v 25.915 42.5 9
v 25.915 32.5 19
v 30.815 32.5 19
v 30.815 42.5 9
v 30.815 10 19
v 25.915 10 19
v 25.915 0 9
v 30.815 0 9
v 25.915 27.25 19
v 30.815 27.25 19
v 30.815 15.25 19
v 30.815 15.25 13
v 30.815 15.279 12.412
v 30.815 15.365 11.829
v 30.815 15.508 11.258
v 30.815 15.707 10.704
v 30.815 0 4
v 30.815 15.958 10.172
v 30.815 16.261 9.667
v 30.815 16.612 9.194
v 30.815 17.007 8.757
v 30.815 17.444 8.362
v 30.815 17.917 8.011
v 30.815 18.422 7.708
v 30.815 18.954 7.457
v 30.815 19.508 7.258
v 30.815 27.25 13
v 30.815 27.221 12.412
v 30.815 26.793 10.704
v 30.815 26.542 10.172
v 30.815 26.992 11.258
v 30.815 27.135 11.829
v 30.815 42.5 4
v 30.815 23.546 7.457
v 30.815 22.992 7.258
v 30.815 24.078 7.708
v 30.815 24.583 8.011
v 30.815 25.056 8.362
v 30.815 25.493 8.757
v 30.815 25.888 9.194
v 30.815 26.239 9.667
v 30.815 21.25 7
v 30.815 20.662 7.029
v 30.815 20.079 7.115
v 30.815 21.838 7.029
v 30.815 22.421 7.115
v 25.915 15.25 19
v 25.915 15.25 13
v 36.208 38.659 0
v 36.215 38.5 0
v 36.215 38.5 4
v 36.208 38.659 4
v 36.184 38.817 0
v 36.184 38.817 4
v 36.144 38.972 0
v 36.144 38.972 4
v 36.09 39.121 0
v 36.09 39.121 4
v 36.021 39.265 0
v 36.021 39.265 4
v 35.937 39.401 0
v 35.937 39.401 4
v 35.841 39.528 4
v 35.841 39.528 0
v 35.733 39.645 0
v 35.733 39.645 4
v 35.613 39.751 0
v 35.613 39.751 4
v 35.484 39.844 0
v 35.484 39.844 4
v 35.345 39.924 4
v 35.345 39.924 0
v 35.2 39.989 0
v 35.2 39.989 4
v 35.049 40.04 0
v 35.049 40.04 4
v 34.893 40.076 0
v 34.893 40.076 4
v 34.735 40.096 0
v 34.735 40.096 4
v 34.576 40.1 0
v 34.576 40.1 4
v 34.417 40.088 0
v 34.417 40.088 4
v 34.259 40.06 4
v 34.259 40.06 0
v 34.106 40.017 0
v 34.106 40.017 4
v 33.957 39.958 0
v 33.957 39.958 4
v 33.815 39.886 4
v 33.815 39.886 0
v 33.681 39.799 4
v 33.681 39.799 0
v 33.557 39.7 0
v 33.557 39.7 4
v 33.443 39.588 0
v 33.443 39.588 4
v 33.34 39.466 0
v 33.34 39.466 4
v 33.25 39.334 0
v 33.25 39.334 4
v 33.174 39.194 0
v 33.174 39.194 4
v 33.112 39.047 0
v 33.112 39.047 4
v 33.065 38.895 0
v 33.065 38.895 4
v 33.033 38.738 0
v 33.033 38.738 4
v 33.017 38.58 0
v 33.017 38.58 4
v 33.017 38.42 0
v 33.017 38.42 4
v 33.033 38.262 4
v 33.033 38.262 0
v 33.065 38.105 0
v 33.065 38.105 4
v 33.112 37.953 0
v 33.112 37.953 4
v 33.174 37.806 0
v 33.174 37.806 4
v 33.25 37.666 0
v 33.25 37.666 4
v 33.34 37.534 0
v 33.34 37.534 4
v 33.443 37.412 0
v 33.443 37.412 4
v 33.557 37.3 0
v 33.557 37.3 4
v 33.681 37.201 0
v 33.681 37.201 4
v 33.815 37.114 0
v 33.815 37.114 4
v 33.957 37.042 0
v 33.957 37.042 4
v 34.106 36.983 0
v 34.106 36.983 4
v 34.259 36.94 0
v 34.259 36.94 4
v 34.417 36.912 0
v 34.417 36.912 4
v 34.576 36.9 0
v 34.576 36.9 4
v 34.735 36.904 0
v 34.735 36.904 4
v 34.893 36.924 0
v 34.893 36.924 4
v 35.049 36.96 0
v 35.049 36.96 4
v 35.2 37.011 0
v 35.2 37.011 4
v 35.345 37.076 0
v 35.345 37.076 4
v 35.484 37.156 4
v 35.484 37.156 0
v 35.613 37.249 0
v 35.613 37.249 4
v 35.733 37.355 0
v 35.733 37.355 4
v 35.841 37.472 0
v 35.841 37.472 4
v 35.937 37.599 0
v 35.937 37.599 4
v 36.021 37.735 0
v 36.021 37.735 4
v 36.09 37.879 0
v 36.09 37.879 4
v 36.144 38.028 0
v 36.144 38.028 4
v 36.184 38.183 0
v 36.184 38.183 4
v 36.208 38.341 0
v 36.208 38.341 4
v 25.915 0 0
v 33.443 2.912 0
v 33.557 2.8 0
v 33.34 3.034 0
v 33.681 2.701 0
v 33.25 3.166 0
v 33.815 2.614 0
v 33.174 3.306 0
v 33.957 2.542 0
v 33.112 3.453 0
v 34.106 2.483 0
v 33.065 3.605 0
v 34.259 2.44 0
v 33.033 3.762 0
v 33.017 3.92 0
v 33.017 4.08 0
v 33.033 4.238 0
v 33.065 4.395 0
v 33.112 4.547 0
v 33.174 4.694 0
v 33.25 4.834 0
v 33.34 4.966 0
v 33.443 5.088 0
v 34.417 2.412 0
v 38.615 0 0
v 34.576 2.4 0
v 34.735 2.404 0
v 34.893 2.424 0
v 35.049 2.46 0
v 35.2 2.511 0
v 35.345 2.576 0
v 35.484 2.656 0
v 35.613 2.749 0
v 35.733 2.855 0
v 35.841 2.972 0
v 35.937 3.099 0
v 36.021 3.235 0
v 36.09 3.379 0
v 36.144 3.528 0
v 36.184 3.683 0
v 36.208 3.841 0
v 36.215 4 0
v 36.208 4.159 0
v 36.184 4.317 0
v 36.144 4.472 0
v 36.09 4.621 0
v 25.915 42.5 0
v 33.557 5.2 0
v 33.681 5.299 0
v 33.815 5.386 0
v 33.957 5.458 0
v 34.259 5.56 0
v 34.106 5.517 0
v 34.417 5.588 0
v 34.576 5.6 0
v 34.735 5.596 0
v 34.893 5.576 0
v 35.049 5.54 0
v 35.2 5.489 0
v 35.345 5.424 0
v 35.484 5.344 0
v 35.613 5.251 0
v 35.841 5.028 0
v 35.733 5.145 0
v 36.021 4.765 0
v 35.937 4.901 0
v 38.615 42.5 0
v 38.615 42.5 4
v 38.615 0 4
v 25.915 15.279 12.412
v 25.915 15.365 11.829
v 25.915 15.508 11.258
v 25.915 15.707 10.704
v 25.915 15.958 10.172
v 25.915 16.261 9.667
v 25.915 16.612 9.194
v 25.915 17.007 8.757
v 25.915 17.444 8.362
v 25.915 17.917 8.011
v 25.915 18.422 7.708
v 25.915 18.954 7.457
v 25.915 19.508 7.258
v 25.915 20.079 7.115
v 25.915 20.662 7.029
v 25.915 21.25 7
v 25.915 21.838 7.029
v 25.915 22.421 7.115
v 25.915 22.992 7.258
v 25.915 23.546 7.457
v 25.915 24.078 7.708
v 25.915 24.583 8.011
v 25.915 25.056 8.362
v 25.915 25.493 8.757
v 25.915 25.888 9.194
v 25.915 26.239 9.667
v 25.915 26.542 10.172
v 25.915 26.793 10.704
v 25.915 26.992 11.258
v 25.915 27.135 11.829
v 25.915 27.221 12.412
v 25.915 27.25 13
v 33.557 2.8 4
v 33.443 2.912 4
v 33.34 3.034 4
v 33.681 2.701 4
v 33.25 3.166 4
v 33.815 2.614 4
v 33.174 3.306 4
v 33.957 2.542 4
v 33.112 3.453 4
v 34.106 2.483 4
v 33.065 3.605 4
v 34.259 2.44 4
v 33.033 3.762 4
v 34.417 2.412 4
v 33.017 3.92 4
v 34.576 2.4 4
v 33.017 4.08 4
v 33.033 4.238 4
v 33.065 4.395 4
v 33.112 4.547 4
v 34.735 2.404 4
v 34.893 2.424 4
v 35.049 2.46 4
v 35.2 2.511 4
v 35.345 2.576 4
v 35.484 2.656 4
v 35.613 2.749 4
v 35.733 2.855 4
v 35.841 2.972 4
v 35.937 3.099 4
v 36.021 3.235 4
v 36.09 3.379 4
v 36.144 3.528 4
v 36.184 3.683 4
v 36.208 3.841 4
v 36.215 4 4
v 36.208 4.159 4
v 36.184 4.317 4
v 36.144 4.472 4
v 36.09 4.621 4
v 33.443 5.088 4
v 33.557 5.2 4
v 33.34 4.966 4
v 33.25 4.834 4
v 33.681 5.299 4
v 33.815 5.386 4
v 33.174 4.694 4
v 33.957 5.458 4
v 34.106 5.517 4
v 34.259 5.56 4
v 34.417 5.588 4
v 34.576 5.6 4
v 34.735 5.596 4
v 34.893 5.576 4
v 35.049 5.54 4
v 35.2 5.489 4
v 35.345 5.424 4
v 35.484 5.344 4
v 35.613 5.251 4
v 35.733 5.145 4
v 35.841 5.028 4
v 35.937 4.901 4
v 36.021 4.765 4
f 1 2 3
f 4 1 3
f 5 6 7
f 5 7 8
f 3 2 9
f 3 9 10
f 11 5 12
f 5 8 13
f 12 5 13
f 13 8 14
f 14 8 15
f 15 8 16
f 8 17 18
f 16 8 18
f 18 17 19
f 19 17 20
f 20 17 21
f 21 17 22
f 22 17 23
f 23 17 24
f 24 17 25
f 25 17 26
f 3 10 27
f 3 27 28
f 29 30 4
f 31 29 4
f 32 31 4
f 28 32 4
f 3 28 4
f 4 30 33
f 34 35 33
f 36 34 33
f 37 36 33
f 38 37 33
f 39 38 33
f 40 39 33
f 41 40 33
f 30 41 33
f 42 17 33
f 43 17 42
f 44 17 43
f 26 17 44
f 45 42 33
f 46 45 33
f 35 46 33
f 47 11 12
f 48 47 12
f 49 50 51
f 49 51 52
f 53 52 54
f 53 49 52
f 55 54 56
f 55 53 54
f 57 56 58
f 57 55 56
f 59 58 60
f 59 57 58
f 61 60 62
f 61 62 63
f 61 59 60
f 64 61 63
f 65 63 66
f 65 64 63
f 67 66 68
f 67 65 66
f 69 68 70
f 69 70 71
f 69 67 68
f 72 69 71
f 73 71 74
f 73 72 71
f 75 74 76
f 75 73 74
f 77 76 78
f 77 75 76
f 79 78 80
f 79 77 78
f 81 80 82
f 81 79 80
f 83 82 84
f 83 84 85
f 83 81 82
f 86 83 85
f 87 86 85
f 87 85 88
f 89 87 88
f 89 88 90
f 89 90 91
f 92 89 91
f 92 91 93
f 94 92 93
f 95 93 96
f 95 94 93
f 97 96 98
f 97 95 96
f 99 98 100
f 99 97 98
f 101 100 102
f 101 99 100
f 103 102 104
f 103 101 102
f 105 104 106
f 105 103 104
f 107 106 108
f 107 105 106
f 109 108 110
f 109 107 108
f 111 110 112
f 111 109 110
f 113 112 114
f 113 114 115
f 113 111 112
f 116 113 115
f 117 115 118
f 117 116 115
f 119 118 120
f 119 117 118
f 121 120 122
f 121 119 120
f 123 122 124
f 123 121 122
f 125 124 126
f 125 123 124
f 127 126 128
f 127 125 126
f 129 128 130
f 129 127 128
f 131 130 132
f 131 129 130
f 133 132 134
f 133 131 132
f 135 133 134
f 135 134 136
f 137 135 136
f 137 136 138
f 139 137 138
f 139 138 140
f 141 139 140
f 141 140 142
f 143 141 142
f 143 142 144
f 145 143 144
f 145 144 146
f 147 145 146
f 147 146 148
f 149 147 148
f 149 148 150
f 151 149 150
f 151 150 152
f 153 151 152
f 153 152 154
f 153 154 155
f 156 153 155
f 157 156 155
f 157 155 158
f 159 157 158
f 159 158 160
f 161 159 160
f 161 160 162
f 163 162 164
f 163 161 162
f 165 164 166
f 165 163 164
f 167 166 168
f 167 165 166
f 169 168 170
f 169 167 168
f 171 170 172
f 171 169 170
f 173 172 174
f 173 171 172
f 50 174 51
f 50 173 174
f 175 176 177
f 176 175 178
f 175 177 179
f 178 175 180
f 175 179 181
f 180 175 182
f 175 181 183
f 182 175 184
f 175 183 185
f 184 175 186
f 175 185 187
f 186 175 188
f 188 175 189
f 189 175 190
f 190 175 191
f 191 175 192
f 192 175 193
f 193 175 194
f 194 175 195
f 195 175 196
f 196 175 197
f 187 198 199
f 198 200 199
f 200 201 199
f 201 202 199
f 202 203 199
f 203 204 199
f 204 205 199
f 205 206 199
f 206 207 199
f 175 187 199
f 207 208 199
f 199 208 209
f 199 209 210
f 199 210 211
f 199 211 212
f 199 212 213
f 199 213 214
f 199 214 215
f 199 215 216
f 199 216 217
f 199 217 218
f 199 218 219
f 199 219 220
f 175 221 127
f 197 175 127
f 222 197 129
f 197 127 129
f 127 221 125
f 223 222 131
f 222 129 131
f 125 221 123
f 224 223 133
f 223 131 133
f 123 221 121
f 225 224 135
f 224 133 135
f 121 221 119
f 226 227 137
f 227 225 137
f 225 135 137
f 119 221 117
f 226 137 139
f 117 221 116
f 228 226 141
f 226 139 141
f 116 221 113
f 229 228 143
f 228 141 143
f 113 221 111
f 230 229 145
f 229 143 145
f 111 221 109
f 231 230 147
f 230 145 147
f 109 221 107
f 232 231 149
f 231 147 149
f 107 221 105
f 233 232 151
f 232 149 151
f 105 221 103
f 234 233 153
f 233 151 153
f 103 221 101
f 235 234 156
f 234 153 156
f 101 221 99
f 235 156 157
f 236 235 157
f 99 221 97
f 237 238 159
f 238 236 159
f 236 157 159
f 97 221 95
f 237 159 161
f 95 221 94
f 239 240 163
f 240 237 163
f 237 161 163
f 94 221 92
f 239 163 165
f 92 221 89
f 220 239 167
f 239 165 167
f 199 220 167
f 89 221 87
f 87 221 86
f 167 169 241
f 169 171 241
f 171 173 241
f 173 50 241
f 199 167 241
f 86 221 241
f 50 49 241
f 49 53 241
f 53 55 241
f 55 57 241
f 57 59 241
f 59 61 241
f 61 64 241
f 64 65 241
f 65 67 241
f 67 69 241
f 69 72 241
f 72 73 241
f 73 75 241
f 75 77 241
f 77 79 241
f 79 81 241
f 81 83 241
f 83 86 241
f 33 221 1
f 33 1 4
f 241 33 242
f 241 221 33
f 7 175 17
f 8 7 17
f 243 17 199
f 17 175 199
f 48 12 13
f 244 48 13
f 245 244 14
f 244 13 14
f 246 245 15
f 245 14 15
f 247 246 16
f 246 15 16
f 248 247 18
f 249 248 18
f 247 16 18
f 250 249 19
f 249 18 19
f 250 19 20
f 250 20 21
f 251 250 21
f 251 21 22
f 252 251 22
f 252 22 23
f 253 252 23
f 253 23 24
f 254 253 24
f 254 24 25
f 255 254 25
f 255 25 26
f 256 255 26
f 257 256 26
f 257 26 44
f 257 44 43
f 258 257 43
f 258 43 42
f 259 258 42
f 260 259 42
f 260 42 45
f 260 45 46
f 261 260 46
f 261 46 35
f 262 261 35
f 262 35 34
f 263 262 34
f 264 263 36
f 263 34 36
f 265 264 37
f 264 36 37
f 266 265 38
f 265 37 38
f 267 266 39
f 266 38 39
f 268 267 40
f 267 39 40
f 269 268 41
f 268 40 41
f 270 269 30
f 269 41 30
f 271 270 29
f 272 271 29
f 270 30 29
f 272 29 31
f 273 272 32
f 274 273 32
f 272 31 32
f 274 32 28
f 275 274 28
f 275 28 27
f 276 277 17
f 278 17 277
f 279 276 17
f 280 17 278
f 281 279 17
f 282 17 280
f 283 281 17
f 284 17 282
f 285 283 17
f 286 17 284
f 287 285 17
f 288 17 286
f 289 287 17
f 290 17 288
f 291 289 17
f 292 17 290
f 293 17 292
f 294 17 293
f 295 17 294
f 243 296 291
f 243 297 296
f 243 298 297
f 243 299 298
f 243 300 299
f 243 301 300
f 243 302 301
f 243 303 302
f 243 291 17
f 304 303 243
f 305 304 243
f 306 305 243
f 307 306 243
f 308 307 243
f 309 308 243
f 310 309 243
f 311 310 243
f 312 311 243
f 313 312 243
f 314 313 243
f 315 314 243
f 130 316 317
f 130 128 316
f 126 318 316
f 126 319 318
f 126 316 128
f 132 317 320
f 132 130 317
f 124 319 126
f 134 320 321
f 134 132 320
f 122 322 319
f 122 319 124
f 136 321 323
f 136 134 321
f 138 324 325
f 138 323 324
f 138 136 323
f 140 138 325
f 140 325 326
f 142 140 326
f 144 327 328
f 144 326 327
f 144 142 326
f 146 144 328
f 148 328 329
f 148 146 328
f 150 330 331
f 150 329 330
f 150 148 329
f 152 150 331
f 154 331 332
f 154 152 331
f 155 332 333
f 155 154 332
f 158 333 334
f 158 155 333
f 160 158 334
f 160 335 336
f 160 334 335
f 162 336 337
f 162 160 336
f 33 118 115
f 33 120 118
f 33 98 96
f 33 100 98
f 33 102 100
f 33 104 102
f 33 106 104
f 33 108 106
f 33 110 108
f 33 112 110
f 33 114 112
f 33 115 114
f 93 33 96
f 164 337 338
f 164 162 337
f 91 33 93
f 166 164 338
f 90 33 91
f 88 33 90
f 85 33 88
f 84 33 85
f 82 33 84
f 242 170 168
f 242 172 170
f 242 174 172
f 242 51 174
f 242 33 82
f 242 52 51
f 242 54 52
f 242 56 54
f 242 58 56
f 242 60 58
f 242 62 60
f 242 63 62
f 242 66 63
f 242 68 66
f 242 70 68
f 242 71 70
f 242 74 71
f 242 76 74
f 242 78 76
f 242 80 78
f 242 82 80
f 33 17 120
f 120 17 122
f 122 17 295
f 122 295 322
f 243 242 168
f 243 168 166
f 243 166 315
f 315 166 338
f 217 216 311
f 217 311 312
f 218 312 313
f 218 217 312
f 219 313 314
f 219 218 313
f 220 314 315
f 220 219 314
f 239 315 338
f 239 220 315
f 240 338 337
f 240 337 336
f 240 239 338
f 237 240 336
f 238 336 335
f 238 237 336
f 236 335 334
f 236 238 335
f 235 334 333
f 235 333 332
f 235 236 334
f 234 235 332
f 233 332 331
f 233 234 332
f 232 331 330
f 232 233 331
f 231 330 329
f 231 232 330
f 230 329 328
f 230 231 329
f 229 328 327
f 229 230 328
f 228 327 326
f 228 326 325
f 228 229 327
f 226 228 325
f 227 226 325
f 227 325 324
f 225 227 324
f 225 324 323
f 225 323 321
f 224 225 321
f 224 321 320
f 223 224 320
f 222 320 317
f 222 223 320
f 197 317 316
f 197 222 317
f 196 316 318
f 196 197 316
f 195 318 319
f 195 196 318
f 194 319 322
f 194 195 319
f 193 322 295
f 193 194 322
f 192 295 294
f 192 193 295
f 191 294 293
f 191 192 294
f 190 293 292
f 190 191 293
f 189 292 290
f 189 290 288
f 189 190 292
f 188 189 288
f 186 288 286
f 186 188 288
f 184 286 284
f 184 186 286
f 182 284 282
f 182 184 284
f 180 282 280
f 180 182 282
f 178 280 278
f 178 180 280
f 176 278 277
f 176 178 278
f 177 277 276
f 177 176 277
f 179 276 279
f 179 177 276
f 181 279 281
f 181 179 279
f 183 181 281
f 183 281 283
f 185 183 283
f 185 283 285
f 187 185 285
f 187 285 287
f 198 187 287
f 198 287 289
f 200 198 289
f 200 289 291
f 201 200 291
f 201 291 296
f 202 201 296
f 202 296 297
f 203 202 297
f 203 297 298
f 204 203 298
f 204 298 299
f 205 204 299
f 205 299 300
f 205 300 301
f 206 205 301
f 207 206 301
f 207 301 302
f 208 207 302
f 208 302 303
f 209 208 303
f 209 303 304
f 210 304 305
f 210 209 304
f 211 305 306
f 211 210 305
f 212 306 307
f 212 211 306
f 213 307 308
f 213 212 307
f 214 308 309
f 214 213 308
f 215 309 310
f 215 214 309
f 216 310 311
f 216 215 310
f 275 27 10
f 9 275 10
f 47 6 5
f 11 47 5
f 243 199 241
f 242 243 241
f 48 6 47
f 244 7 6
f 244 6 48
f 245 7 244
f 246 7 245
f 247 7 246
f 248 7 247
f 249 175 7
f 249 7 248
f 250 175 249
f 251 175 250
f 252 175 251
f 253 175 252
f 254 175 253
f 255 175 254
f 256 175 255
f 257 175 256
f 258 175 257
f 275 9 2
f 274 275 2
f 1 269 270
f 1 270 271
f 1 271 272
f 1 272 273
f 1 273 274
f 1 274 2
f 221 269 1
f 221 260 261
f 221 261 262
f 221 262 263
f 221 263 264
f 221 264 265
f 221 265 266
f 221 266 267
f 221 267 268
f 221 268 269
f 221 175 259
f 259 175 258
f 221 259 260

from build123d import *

# Parameters (mm, degrees)
ESQUISSE1_W             = 12.7
ESQUISSE1_H             = 42.5
ESQUISSE1_R             = 1.6
BOSS_EXTRU_1_DEPTH      = 4
ESQUISSE2_W             = 4.9
ESQUISSE2_H             = 42.5
BOSS_EXTRU_2_DEPTH      = 15
ENL_V_MAT_EXTRU_1_DEPTH = 5.9
CHANFREIN1_SIZE         = 10


with BuildPart() as part:
    # Esquisse1 → Boss.-Extru.1 (new body)
    with BuildSketch(Plane.XY):
        with Locations((32.265489842, 21.249999998)):
            Rectangle(ESQUISSE1_W, ESQUISSE1_H)
        with Locations((34.615489842, 3.999999998)):
            Circle(ESQUISSE1_R, mode=Mode.SUBTRACT)
        with Locations((34.615489842, 38.499999998)):
            Circle(ESQUISSE1_R, mode=Mode.SUBTRACT)
    extrude(amount=BOSS_EXTRU_1_DEPTH)

    # Esquisse2 → Boss.-Extru.2 (add)
    with BuildSketch(Plane.XY.offset(4)):
        with Locations((28.365489842, 21.249999998)):
            Rectangle(ESQUISSE2_W, ESQUISSE2_H)
    extrude(amount=BOSS_EXTRU_2_DEPTH)

    # Esquisse3 → Enlèv. mat.-Extru.1 (cut, through all)
    with BuildSketch(Plane(origin=(30.815489842, 0, 0), x_dir=(0, 0, -1), z_dir=(1, 0, 0))):
        with BuildLine():
            Line((-13, 27.250000431), (-19, 27.250000431))
            Line((-19, 27.250000431), (-19, 15.250000431))
            Line((-19, 15.250000431), (-13, 15.250000431))
            ThreePointArc((-13, 15.250000431), (-7, 21.250000431), (-13, 27.250000431))
        make_face()
    extrude(amount=-ENL_V_MAT_EXTRU_1_DEPTH, mode=Mode.SUBTRACT)

    # Chanfrein1
    chanfrein1_edges = [part.edges().sort_by_distance(p)[0] for p in [
        (28.365489842, 42.499999998, 19),
        (28.365489842, -2e-09, 19),
    ]]
    chamfer(chanfrein1_edges, length=CHANFREIN1_SIZE)


solid = part.part
